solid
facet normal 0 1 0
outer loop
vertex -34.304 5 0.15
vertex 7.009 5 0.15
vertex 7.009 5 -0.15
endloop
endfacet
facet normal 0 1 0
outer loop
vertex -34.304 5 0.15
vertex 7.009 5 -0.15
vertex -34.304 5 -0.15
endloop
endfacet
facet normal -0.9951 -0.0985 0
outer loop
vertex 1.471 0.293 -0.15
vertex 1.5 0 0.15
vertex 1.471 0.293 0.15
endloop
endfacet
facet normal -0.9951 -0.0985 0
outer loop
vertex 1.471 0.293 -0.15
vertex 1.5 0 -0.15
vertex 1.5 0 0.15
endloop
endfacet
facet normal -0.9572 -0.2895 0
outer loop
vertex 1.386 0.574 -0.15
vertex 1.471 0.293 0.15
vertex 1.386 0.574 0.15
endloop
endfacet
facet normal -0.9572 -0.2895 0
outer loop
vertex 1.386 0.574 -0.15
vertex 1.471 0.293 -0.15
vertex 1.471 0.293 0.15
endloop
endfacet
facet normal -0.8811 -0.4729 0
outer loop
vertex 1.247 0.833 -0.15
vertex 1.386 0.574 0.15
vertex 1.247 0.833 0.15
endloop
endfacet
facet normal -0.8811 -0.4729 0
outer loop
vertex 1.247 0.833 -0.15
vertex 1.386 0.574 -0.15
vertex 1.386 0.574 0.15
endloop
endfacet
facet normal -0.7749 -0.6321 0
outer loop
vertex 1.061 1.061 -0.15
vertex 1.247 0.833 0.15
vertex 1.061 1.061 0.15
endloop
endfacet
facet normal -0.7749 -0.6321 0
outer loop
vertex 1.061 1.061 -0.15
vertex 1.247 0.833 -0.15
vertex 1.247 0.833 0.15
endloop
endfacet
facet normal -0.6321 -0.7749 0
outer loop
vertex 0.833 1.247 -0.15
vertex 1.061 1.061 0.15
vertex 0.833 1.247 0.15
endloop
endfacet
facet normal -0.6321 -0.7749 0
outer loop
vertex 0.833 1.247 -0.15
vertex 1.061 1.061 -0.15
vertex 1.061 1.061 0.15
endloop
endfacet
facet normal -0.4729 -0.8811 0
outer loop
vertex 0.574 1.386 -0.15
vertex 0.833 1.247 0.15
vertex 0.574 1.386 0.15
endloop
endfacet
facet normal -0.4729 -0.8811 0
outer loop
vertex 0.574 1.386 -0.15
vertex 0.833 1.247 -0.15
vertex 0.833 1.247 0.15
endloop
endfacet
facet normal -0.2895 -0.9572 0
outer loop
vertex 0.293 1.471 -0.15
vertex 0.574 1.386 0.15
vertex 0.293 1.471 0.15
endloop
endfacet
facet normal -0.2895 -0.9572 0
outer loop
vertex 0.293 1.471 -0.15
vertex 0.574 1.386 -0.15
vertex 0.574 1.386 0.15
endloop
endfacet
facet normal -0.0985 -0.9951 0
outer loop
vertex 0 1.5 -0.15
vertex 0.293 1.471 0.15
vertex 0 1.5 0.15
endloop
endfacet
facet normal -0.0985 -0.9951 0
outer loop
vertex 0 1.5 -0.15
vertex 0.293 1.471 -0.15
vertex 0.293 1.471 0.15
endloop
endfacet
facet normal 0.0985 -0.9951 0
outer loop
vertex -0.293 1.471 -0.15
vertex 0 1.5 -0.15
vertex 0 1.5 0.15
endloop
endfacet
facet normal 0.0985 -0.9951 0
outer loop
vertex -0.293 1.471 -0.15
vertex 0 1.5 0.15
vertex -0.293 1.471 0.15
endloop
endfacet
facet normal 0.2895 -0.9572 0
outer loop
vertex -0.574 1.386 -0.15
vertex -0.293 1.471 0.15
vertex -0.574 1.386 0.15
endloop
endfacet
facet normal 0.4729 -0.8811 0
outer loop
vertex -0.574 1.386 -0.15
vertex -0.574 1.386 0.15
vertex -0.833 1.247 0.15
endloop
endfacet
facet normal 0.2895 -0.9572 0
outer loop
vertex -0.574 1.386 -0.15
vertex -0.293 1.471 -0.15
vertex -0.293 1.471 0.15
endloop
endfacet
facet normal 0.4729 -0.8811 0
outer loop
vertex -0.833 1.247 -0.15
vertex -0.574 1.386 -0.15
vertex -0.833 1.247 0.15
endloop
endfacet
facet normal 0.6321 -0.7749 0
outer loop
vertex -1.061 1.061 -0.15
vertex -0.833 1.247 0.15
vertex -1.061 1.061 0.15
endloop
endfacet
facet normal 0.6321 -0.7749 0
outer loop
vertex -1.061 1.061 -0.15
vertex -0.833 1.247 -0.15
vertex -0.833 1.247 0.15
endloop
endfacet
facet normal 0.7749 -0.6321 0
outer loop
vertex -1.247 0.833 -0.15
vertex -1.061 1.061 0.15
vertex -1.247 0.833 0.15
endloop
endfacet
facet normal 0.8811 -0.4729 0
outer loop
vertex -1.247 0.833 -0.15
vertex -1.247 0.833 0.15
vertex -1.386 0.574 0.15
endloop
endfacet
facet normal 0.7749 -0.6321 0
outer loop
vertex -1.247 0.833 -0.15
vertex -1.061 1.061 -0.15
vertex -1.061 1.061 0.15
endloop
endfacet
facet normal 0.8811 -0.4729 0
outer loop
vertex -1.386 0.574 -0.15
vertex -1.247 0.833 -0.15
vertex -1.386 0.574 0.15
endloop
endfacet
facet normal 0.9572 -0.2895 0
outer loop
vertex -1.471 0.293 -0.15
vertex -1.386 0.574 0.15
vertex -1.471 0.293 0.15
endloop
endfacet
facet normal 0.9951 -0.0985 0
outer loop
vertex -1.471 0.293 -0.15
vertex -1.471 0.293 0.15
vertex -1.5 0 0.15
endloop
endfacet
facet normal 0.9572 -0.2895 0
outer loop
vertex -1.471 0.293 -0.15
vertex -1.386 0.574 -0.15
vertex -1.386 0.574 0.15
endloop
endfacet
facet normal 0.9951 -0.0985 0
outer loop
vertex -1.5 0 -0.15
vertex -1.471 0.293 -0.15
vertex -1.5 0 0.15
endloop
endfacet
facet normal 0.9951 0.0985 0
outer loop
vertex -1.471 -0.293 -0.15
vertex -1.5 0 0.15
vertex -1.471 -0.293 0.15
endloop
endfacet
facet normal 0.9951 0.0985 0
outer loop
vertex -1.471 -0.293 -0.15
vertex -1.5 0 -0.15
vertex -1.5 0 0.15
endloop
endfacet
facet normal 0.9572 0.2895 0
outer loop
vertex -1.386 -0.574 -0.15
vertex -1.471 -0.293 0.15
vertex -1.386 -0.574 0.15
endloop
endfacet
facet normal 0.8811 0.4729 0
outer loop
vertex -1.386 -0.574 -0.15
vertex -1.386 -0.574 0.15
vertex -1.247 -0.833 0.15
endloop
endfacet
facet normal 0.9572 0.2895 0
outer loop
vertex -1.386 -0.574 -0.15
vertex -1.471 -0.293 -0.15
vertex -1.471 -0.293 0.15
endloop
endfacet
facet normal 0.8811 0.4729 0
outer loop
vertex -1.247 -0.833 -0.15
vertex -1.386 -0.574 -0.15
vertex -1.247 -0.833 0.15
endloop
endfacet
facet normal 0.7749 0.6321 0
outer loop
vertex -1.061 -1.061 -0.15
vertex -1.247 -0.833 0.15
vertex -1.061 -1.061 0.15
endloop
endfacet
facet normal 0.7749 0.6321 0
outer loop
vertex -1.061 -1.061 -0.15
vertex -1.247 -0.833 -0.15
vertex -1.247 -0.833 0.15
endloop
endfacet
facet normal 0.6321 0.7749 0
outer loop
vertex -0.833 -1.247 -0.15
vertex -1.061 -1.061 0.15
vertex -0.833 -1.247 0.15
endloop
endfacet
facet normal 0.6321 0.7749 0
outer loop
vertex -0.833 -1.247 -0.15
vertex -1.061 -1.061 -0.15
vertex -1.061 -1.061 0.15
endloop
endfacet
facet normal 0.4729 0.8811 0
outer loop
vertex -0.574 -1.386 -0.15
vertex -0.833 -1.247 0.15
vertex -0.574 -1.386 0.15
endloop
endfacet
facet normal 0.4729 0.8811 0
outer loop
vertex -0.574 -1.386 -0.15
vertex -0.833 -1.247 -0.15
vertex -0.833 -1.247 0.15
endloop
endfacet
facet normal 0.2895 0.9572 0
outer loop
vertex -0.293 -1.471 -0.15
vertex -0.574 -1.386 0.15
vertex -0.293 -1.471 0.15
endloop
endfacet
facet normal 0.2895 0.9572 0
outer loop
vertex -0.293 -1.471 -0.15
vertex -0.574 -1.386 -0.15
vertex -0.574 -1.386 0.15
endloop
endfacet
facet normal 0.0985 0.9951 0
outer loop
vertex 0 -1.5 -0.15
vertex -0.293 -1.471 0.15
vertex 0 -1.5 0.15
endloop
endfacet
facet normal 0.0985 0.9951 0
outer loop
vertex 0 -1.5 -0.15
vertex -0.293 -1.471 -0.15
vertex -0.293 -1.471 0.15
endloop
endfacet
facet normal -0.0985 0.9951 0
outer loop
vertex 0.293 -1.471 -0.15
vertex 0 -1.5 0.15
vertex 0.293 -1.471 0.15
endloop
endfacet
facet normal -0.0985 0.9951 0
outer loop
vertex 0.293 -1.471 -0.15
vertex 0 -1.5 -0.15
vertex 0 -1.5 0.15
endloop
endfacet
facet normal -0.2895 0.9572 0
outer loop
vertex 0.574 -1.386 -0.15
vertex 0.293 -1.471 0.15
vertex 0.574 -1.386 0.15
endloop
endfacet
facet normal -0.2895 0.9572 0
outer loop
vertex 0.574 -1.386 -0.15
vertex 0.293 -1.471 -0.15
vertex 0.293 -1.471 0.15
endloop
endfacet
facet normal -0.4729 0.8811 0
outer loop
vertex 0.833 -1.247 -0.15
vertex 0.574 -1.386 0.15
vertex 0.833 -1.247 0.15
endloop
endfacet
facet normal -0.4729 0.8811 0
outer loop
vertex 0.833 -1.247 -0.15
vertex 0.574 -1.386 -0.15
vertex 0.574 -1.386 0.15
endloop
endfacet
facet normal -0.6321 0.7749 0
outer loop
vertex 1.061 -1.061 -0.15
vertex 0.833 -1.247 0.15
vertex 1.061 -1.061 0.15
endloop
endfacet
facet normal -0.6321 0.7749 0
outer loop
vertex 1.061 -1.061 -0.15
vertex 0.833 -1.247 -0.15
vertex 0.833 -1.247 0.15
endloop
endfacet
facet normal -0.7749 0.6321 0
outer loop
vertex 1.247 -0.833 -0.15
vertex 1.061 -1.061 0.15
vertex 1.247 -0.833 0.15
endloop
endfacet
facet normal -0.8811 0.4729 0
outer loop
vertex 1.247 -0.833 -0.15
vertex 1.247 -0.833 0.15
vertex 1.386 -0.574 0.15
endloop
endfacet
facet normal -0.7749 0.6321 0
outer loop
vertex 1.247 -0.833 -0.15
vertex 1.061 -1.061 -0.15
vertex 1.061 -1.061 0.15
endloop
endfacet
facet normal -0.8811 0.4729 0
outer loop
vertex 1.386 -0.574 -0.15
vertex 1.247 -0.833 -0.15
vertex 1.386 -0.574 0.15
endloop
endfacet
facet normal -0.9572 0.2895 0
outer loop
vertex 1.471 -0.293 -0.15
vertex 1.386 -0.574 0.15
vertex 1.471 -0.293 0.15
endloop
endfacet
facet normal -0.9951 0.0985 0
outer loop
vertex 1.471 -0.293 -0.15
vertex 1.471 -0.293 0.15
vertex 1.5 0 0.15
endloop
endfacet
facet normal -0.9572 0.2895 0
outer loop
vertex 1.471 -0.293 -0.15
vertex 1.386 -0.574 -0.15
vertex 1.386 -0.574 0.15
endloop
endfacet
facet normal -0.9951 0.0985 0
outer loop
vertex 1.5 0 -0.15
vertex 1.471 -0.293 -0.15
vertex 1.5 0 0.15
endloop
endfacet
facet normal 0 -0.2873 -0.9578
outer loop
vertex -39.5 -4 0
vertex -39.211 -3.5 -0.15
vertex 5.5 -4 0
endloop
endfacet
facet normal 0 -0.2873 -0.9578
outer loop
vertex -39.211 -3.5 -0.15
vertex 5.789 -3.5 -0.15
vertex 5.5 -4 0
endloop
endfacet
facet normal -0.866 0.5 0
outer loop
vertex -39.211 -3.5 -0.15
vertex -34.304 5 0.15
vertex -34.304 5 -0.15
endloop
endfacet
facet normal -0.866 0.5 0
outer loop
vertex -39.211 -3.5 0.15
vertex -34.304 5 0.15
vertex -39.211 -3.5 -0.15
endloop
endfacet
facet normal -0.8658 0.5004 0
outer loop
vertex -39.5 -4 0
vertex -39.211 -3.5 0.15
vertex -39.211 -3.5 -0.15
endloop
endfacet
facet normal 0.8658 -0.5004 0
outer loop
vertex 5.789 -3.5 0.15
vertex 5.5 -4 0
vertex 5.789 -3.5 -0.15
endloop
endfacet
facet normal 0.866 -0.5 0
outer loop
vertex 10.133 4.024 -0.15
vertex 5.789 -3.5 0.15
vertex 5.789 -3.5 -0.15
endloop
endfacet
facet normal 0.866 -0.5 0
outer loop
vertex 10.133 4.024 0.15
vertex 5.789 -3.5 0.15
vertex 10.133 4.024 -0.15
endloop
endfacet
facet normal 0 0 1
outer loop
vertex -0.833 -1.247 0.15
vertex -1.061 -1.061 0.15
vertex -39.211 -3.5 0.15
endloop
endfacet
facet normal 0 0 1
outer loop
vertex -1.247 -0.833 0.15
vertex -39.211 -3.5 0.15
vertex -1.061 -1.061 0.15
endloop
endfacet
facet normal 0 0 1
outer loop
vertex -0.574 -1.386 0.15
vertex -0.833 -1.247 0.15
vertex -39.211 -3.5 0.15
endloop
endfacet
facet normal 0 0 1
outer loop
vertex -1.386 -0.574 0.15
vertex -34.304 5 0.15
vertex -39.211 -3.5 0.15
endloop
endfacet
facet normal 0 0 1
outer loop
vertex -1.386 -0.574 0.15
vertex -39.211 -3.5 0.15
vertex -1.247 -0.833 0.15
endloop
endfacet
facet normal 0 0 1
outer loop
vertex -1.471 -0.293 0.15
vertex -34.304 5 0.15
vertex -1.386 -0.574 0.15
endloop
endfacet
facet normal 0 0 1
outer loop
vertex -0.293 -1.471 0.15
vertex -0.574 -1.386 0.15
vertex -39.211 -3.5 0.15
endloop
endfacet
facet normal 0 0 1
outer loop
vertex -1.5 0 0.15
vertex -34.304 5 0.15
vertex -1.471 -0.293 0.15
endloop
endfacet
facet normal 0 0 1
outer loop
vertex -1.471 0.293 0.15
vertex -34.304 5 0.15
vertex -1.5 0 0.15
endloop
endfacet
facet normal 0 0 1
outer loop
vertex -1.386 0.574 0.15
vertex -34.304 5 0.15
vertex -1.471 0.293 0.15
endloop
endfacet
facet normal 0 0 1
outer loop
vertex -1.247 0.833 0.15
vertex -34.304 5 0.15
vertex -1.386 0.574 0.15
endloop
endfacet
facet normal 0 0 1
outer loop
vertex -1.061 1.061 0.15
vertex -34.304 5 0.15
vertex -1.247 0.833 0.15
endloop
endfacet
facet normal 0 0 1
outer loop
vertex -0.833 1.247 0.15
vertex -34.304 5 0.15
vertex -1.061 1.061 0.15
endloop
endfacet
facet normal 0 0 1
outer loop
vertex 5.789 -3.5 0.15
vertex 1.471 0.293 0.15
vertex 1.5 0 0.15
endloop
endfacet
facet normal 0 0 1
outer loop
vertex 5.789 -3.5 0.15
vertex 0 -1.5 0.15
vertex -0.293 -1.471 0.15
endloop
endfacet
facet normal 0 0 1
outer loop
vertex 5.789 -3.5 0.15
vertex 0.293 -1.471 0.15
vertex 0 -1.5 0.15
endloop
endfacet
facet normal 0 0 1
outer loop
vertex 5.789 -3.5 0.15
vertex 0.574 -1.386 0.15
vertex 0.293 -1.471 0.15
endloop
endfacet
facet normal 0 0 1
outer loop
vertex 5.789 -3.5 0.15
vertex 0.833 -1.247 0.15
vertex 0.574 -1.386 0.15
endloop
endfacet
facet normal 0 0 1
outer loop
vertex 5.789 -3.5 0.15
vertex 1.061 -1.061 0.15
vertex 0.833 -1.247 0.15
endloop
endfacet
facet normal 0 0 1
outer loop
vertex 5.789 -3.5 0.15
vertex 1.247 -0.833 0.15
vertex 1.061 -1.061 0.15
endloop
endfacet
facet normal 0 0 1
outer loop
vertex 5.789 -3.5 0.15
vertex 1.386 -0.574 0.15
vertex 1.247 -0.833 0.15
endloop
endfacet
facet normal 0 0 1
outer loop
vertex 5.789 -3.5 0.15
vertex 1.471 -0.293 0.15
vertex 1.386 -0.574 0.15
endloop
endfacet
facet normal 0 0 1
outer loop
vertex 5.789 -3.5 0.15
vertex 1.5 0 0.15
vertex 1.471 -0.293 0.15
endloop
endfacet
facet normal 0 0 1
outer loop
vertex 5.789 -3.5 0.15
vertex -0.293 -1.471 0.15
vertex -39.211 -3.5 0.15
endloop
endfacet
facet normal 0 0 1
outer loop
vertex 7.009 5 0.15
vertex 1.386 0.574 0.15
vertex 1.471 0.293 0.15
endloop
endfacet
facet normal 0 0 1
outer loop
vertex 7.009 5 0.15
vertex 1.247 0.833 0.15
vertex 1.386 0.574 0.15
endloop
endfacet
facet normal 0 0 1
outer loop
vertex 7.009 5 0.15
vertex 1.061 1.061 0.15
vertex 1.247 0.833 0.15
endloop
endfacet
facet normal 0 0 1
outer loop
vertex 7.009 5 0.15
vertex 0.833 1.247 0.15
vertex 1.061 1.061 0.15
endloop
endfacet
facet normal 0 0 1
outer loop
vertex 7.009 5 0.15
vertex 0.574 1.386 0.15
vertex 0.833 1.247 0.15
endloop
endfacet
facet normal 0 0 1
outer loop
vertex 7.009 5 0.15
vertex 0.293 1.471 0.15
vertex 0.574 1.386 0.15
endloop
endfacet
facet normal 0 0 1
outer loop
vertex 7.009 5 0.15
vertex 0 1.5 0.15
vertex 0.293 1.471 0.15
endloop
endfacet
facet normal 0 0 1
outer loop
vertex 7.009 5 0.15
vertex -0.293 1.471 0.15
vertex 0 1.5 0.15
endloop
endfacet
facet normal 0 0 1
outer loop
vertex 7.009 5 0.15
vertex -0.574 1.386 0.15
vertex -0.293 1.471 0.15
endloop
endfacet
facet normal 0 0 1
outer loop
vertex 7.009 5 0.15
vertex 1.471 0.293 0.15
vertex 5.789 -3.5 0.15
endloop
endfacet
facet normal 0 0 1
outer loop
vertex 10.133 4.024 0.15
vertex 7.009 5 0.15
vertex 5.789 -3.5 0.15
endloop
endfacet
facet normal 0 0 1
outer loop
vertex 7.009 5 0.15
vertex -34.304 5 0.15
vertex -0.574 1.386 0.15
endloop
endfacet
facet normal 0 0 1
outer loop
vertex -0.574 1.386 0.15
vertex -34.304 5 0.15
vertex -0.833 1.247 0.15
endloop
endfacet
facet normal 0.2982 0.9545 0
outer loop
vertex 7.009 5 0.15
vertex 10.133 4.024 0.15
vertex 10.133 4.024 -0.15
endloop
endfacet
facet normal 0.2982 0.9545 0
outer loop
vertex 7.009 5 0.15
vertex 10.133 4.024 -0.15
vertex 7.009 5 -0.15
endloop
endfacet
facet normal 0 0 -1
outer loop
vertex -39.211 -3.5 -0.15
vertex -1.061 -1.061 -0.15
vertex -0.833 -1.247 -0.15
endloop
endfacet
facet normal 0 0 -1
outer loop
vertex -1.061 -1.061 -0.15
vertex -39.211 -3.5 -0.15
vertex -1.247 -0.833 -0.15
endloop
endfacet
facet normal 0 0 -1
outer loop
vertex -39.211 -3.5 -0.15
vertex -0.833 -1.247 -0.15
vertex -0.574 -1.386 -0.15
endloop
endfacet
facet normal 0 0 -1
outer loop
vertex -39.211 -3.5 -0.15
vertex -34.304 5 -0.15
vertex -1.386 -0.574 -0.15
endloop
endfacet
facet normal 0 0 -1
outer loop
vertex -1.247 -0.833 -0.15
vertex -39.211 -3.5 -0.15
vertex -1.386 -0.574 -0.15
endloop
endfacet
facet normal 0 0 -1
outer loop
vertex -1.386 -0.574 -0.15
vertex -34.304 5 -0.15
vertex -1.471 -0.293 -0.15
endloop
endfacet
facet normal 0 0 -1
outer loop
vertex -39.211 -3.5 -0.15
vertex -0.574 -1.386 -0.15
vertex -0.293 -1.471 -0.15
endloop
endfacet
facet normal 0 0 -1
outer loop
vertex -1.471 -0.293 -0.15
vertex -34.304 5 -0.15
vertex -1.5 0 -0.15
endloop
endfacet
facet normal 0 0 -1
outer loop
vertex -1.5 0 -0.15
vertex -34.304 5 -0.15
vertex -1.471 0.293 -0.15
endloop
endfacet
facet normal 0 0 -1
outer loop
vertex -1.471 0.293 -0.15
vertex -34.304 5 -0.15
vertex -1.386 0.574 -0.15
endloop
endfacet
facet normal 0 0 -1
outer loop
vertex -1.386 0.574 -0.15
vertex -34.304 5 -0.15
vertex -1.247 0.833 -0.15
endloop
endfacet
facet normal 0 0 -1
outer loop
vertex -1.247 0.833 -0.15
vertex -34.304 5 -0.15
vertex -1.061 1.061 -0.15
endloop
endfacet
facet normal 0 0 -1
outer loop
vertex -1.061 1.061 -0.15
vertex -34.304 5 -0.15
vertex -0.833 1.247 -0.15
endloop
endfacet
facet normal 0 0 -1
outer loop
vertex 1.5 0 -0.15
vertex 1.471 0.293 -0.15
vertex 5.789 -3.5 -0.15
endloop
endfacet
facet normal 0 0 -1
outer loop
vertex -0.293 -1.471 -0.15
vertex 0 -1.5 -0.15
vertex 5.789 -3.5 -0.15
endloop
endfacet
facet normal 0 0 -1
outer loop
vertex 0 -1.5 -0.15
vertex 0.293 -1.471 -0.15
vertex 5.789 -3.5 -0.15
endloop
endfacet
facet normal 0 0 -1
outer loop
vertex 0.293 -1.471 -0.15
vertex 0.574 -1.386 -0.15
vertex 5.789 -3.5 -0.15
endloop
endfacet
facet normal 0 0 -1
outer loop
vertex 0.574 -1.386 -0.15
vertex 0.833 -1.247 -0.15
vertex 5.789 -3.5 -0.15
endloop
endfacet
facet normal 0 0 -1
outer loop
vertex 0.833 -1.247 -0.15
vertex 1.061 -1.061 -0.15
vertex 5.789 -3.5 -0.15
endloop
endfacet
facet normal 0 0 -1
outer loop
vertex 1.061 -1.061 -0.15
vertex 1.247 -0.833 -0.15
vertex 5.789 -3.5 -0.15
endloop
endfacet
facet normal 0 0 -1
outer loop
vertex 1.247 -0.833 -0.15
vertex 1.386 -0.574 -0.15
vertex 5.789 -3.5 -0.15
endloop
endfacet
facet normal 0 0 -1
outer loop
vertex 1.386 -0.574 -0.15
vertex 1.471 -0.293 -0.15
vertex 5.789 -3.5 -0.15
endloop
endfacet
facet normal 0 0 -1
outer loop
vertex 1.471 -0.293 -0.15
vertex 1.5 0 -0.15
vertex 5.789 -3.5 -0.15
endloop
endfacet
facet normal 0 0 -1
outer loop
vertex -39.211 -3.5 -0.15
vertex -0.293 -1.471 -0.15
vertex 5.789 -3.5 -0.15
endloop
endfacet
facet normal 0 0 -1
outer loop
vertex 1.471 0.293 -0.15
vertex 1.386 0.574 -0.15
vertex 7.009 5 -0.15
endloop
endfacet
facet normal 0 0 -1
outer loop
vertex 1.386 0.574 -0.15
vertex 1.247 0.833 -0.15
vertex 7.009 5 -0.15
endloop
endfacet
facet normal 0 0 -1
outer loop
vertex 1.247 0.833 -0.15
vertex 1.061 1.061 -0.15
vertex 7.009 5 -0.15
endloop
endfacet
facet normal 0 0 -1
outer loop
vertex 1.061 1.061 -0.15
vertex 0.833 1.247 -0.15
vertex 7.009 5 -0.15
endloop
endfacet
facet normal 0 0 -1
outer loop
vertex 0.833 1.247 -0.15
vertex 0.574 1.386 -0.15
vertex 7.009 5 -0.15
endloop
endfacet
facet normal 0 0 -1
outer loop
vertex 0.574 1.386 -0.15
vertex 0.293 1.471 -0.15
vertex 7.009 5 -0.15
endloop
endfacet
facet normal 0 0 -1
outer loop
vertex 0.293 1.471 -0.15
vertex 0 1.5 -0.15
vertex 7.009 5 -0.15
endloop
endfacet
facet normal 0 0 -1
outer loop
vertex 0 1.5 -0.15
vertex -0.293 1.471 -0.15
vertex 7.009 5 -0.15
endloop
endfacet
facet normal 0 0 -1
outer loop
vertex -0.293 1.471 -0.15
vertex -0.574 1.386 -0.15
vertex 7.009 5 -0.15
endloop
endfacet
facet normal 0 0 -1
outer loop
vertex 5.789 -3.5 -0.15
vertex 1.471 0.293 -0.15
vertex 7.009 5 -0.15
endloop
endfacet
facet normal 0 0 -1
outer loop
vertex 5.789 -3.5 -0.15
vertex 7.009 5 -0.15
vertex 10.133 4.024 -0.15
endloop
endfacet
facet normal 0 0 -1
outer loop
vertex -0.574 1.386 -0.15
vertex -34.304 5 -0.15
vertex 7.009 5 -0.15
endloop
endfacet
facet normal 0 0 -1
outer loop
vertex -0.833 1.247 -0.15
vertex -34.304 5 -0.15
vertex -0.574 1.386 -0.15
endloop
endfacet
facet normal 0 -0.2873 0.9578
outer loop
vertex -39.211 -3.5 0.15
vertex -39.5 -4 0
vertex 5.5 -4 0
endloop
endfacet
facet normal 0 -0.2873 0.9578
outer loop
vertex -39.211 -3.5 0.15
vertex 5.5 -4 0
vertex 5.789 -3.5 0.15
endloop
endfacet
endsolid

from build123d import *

# Parameters (mm, degrees)
SKETCH_1_R               = 1.5
EXTRUDE_1_DEPTH          = 0.15
CUT_EXTRUDE_1_DEPTH      = 13
CUT_EXTRUDE_1_DEPTH_BACK = 80.3
CUT_EXTRUDE_2_DEPTH      = 1.3


with BuildPart() as part:
    # 草图1 → 凸台-拉伸1 (new body, symmetric)
    with BuildSketch(Plane.XY):
        with BuildLine():
            Line((-74.5, -4), (5.5, -4))
            Line((5.5, -4), (10.132667282, 4.024015107))
            Line((10.132667282, 4.024015107), (7.009129504, 5))
            Line((7.009129504, 5), (-65.987869266, 5))
            ThreePointArc((-65.987869266, 5), (-67.885405091, 4.344282156), (-69.867332718, 4.024015107))
            Line((-69.867332718, 4.024015107), (-74.5, -4))
        make_face()
        Circle(SKETCH_1_R, mode=Mode.SUBTRACT)
    extrude(amount=EXTRUDE_1_DEPTH, both=True)

    # 草图3 → 切除-拉伸1 (cut, two sides)
    with BuildSketch(Plane(origin=(0, 0, 0), x_dir=(0, 0, -1), z_dir=(1, 0, 0))) as cut_extrude_1_sk:
        Polygon((0, -4), (-0.15, -3.5), (-0.747270974, -4.330450708), (0.60266722, -4.330450708), (0.15, -3.5), align=None)
    extrude(amount=CUT_EXTRUDE_1_DEPTH, mode=Mode.SUBTRACT)
    extrude(cut_extrude_1_sk.sketch, amount=-CUT_EXTRUDE_1_DEPTH_BACK, mode=Mode.SUBTRACT)

    # 草图7 → 切除-拉伸2 (cut, through all)
    with BuildSketch(Plane.XY.offset(0.15)):
        Polygon((-30.476363603, 11.629396709), (-39.5, -4), (-74.5, -4), (-62.953845349, 15.998526488), align=None)
    extrude(amount=-CUT_EXTRUDE_2_DEPTH, mode=Mode.SUBTRACT)


solid = part.part
